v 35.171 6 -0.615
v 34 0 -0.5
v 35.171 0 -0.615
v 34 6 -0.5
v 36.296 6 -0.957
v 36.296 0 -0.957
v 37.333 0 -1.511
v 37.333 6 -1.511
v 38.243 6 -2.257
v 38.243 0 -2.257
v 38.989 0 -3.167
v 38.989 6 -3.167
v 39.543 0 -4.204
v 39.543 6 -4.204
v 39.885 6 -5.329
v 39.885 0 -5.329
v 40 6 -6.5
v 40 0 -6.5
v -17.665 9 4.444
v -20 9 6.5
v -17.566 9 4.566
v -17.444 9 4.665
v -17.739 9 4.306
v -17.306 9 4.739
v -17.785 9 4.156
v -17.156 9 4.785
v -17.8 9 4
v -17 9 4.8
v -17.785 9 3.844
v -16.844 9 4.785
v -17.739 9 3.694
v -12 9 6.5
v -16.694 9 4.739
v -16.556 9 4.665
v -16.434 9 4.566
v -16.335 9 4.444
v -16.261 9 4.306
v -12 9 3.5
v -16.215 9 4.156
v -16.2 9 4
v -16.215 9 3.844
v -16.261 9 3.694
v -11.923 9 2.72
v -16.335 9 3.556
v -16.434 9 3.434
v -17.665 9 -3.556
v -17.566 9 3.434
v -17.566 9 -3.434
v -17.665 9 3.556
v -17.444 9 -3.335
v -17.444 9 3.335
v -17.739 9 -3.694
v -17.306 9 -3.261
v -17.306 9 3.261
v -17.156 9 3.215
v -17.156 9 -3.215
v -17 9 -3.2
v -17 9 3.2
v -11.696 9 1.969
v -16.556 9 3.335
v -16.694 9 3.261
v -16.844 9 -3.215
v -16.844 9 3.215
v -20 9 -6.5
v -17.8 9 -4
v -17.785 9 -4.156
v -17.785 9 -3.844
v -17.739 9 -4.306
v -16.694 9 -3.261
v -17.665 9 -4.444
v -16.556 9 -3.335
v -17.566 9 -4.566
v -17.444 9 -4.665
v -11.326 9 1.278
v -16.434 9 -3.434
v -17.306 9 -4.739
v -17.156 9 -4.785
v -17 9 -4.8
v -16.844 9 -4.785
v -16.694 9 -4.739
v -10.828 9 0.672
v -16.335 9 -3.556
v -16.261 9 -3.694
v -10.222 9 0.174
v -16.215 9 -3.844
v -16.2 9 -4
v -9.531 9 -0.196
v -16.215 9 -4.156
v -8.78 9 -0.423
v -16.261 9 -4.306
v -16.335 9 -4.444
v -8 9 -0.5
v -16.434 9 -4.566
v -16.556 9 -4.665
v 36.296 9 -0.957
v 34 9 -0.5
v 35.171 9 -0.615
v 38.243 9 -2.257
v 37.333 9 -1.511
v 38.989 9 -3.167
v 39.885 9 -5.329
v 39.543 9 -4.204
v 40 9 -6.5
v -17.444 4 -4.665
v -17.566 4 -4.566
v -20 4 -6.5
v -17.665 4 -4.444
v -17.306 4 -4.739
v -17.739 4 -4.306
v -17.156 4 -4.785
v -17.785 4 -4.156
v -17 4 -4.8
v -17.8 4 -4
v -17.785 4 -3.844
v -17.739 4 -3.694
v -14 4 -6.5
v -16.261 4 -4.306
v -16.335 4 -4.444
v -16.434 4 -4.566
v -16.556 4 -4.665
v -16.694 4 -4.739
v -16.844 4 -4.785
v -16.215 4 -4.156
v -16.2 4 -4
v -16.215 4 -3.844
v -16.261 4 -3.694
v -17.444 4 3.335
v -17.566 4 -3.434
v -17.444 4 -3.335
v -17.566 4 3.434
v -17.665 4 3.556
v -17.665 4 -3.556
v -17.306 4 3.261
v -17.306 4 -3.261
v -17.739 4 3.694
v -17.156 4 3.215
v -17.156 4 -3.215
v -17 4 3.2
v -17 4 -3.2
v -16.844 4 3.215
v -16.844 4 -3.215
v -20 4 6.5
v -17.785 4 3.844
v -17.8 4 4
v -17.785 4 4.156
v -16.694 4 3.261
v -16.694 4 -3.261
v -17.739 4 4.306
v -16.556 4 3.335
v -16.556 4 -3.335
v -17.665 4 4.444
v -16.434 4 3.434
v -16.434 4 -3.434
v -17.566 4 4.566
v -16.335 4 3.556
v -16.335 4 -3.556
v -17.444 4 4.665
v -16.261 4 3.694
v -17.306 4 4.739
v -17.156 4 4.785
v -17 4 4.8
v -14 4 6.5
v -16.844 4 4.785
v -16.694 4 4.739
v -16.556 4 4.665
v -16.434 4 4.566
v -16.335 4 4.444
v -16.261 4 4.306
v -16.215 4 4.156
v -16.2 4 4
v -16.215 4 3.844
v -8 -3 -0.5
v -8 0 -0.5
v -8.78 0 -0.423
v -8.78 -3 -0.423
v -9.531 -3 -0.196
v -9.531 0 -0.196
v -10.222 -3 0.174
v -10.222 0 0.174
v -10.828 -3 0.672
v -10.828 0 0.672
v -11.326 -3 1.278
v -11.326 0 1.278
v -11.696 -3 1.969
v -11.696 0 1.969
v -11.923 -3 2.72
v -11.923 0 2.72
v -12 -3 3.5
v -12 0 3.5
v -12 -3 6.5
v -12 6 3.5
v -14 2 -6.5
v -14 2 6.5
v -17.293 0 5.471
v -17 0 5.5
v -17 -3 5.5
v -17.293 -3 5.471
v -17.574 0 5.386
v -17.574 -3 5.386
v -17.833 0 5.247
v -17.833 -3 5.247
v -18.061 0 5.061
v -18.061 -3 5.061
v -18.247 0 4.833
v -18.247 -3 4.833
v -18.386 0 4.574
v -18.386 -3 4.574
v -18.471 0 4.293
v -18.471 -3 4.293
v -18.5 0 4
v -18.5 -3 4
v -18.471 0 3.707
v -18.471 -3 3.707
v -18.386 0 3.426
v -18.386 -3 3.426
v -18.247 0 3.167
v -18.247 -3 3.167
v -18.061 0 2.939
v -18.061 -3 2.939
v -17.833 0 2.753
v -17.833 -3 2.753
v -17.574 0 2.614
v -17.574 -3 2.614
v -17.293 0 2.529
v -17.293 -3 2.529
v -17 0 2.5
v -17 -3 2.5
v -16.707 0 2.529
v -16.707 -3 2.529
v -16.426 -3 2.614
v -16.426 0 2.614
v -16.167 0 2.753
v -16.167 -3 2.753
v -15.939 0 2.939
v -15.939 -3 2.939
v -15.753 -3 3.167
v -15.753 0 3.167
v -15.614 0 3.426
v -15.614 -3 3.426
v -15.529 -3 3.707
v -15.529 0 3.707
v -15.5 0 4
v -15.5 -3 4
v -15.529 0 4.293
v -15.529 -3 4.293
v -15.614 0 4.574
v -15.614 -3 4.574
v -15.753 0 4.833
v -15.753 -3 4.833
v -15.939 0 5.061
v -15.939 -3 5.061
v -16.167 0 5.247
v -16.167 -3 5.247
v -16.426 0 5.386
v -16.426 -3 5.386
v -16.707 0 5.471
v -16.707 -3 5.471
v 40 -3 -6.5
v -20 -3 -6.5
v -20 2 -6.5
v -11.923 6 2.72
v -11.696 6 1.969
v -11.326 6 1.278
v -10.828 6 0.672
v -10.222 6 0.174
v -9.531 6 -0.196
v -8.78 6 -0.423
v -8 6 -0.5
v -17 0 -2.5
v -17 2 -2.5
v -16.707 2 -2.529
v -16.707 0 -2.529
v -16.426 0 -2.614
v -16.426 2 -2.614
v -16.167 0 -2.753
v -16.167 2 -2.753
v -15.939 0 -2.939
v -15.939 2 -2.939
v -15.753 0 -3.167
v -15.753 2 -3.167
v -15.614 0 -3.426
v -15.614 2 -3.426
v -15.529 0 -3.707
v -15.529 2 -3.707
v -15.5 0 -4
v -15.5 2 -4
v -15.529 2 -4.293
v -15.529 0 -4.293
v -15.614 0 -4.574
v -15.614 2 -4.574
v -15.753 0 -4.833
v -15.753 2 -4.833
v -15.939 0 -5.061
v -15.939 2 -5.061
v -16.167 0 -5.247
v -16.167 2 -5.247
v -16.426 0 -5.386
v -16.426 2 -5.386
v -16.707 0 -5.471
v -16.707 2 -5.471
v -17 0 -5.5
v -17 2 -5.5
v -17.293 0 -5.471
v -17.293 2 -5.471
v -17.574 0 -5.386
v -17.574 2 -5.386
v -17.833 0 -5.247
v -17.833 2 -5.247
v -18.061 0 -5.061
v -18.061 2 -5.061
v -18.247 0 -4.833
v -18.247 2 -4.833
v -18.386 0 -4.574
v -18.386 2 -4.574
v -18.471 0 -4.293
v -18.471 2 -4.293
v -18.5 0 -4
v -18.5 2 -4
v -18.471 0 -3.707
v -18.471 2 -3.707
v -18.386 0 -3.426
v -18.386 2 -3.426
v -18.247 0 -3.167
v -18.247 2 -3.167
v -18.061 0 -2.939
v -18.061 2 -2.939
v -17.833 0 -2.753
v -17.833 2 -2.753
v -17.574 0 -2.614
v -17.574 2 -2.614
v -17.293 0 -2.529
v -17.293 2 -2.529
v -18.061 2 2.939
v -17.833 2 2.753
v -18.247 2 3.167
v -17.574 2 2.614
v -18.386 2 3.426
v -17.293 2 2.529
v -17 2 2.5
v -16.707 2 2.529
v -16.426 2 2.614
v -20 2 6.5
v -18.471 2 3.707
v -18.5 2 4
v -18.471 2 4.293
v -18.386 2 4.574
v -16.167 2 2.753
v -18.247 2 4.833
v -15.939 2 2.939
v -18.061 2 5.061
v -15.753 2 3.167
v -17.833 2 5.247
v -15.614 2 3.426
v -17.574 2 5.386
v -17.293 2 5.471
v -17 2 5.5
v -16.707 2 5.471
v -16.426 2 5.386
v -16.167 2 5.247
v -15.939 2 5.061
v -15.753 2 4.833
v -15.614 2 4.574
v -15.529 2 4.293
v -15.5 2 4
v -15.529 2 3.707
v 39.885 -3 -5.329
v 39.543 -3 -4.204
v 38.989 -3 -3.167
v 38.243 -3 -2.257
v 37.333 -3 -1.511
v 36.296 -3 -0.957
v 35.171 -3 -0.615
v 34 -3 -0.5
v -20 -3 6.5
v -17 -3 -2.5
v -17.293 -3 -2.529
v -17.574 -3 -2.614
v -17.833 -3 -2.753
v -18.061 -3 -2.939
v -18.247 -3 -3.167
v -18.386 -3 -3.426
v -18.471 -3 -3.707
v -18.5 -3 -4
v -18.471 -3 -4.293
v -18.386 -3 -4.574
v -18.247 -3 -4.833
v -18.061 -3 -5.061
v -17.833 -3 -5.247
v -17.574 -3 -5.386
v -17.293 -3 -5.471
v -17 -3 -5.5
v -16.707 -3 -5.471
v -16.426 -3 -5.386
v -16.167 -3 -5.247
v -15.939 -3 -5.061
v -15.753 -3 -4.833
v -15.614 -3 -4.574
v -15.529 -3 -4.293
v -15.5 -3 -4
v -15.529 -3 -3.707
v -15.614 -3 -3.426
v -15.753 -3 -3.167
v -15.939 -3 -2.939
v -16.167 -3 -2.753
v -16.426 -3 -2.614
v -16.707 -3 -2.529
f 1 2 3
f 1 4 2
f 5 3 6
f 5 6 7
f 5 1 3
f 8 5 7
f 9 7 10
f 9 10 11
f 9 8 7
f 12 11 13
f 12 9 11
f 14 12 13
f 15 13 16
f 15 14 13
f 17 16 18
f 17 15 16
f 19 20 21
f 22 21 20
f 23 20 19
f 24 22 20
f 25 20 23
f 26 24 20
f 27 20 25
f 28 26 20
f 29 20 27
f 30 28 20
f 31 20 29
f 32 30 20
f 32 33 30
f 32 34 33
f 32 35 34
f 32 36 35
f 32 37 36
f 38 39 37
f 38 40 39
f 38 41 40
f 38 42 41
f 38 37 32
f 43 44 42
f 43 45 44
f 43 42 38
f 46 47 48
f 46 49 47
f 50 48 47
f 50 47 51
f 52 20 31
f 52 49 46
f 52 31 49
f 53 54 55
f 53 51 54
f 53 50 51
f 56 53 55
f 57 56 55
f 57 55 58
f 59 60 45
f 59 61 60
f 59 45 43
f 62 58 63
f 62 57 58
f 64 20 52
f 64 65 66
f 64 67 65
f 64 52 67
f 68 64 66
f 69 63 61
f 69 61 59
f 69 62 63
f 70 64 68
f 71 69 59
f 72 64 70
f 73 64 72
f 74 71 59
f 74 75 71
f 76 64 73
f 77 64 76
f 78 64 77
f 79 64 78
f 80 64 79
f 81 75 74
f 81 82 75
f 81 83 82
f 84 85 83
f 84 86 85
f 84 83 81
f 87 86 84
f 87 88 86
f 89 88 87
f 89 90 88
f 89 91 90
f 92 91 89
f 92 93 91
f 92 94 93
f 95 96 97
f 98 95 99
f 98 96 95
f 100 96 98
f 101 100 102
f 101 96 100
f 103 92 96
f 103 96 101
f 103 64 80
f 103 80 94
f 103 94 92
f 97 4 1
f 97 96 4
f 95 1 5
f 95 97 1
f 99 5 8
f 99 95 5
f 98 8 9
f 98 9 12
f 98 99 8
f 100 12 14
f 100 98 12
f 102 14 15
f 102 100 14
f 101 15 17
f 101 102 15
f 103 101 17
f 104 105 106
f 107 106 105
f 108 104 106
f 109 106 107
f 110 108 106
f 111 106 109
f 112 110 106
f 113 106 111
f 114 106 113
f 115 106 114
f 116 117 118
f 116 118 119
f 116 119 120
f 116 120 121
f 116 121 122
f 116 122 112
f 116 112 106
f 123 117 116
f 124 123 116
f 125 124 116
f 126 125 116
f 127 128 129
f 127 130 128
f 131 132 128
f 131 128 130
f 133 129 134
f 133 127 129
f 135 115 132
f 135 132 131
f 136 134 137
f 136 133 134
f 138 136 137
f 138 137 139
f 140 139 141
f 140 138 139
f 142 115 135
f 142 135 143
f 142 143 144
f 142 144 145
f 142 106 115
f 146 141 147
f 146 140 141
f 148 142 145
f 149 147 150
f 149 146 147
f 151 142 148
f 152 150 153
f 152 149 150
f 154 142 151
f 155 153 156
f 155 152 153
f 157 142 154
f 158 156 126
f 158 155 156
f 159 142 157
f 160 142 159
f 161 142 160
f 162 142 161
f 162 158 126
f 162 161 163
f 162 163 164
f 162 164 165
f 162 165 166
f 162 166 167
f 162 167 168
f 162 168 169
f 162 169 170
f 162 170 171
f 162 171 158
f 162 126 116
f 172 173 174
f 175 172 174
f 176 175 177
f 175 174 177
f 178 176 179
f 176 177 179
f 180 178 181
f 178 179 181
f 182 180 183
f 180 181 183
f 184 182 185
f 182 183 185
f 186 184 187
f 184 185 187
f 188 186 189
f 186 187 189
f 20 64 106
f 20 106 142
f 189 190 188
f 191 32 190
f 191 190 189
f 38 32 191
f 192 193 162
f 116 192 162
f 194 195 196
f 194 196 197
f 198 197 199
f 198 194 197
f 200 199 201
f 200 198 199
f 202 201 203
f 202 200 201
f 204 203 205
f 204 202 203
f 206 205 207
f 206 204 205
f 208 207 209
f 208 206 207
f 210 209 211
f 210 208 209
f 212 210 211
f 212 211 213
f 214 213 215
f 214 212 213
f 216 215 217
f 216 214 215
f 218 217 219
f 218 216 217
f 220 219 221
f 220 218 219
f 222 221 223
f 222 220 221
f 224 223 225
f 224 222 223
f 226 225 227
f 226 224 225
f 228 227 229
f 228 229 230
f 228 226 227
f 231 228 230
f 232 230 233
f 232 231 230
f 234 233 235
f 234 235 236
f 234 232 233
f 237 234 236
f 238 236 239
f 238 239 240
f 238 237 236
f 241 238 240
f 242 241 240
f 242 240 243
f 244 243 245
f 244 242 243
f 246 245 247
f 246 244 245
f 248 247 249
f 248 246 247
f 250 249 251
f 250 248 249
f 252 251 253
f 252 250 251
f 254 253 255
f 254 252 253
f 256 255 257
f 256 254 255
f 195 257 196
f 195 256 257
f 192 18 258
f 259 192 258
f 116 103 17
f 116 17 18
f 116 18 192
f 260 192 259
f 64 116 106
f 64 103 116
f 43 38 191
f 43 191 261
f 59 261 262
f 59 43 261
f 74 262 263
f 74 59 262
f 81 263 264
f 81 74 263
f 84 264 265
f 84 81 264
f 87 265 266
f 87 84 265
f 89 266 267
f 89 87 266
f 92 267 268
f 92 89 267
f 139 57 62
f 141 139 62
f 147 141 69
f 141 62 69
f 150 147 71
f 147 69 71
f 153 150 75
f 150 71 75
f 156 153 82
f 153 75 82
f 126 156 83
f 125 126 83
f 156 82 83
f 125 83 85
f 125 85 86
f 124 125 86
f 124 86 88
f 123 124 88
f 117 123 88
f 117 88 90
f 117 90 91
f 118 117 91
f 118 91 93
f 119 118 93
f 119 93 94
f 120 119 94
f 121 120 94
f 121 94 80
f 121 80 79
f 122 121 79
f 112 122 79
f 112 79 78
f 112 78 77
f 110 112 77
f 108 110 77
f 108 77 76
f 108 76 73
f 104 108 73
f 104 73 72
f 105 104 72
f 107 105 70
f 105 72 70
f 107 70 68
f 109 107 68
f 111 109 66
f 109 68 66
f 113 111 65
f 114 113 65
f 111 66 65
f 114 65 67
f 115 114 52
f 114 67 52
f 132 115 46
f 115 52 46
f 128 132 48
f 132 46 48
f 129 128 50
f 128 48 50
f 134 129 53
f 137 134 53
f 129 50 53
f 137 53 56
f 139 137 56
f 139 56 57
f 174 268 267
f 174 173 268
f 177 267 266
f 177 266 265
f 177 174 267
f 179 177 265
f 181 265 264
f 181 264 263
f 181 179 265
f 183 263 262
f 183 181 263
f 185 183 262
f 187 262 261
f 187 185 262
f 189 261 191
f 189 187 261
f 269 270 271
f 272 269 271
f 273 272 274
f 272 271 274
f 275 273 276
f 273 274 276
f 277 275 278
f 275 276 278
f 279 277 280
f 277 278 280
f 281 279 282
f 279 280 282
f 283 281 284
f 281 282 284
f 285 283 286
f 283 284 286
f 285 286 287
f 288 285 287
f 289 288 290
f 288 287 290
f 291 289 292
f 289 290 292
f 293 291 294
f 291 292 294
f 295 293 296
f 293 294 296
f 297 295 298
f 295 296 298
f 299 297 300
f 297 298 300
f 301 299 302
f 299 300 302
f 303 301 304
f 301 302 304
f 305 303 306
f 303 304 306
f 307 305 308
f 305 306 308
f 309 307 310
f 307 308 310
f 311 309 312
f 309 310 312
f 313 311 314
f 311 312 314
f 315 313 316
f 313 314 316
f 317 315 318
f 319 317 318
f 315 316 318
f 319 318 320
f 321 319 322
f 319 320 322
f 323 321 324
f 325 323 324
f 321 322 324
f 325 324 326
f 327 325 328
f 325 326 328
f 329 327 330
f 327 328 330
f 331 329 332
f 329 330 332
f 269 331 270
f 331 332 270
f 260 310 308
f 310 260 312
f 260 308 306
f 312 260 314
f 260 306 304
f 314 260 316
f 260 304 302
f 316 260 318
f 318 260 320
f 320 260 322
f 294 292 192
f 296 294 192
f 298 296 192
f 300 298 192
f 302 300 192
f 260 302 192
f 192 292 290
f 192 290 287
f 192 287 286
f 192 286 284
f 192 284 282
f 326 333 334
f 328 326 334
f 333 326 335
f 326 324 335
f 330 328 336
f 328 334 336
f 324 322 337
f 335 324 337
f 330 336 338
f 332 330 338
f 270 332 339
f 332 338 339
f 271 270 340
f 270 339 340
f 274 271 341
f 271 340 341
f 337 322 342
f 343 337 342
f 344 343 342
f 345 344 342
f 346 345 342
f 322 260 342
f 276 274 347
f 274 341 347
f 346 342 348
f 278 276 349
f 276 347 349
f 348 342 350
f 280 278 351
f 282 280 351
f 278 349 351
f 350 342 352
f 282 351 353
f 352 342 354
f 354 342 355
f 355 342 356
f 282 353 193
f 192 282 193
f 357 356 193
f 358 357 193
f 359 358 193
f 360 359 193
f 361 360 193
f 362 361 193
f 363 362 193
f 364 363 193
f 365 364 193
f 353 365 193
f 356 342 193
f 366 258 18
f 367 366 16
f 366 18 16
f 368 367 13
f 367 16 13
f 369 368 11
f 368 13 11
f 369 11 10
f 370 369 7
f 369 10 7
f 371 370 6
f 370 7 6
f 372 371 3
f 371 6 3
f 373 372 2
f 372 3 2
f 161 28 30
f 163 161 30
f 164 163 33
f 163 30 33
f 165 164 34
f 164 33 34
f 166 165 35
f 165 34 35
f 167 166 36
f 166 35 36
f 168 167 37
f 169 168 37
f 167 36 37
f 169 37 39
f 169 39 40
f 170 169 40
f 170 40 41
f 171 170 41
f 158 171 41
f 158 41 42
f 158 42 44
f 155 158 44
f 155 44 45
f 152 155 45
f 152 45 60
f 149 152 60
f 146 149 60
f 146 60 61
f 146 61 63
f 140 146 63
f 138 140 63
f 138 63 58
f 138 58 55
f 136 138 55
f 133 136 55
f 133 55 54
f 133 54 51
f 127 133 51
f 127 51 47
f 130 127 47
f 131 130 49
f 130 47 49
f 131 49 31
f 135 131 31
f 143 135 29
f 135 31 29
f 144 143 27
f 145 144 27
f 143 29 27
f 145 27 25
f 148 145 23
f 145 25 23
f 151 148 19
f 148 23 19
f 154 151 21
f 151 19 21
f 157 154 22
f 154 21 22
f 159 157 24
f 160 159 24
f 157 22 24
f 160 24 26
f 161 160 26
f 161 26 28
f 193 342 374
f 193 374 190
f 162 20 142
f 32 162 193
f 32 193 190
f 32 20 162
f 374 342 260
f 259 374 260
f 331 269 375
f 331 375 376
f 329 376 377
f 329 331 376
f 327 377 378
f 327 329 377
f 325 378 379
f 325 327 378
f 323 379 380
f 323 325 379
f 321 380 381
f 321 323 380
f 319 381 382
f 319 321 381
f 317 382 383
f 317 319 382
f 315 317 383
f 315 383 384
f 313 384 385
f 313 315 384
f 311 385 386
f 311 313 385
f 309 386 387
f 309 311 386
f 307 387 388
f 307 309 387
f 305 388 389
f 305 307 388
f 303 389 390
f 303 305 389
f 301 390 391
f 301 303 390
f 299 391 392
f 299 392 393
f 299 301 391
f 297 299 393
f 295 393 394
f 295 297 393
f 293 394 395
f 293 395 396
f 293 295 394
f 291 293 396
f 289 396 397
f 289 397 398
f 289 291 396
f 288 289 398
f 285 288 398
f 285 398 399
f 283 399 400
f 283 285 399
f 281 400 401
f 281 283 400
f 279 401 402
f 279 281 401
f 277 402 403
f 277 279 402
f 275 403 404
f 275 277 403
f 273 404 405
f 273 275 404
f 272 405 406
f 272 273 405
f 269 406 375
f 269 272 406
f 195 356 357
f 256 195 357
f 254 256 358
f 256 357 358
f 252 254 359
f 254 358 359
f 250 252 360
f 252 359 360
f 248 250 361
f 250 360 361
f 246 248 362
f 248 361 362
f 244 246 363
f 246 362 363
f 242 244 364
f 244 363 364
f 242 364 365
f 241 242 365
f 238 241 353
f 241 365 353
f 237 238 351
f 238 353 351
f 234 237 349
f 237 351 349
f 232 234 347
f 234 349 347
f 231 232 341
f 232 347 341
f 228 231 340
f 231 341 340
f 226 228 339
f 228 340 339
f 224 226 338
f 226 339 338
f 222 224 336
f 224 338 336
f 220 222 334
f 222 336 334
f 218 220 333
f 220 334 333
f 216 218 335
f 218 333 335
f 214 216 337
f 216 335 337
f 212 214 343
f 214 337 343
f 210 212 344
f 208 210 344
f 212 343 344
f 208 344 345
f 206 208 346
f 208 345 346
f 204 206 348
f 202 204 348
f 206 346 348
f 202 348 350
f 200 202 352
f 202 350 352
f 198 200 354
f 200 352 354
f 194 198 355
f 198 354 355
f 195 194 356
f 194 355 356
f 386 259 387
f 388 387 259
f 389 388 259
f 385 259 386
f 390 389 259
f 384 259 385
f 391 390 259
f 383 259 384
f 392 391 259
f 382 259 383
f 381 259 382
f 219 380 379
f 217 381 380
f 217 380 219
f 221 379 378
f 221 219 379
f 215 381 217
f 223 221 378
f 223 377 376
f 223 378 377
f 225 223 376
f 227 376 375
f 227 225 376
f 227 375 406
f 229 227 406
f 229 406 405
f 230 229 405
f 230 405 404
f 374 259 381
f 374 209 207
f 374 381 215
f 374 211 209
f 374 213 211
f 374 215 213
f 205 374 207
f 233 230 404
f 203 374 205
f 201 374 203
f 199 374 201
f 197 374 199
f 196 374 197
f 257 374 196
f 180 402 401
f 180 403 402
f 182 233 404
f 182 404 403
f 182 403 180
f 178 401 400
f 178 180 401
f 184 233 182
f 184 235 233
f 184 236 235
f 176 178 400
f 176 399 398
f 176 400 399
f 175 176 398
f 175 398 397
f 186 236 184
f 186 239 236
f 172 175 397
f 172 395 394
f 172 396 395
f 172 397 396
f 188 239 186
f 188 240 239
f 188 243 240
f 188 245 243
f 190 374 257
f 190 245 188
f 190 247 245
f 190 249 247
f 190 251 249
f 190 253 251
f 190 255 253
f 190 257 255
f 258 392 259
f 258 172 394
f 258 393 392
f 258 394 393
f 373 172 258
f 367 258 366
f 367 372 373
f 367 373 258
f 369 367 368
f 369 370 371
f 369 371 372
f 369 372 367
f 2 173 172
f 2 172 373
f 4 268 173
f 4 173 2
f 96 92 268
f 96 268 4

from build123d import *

# Parameters (mm, degrees)
SKETCH1_W           = 40
SKETCH1_H           = 13
BOSS_EXTRUDE1_DEPTH = 6
SKETCH2_W           = 6
SKETCH2_H           = 2
CUT_EXTRUDE1_DEPTH  = 25.596747752
SKETCH3_R           = 0.8
CUT_EXTRUDE2_DEPTH  = 2
SKETCH4_W           = 32
SKETCH4_H           = 7
CUT_EXTRUDE3_DEPTH  = 22.868927729
FILLET1_R           = 4
SKETCH5_R           = 1.5
CUT_EXTRUDE4_DEPTH  = 2
SKETCH6_W           = 6
SKETCH6_H           = 6
BOSS_EXTRUDE2_DEPTH = 20
FILLET3_R           = 6
SKETCH7_R           = 1.5
BOSS_EXTRUDE3_DEPTH = 3
BOSS_EXTRUDE4_START = 3
SKETCH8_R           = 0.8
BOSS_EXTRUDE4_DEPTH = 3


with BuildPart() as part:
    # Sketch1 → Boss-Extrude1 (new body)
    with BuildSketch(Plane(origin=(0, 0, 0), x_dir=(1, 0, 0), z_dir=(0, 1, 0))):
        Rectangle(SKETCH1_W, SKETCH1_H)
    extrude(amount=BOSS_EXTRUDE1_DEPTH)

    # Sketch2 → Cut-Extrude1 (cut, through all)
    with BuildSketch(Plane.XY.offset(6.5)):
        with Locations((-17, 3)):
            Rectangle(SKETCH2_W, SKETCH2_H)
    extrude(amount=-CUT_EXTRUDE1_DEPTH, mode=Mode.SUBTRACT)

    # Sketch3 → Cut-Extrude2 (cut)
    with BuildSketch(Plane(origin=(0, 6, 0), x_dir=(1, 0, 0), z_dir=(0, 1, 0))):
        with Locations(Location((-17, 4, 0), (0, 0, 270))):
            Circle(SKETCH3_R)
        with Locations(Location((-17, -4, 0), (0, 0, 270))):
            Circle(SKETCH3_R)
    extrude(amount=-CUT_EXTRUDE2_DEPTH, mode=Mode.SUBTRACT)

    # Sketch4 → Cut-Extrude3 (cut, through all)
    with BuildSketch(Plane(origin=(0, 6, 0), x_dir=(1, 0, 0), z_dir=(0, 1, 0))):
        with Locations((4, -3)):
            Rectangle(SKETCH4_W, SKETCH4_H)
    extrude(amount=-CUT_EXTRUDE3_DEPTH, mode=Mode.SUBTRACT)

    # Fillet1
    fillet1_edges = [part.edges().sort_by_distance(p)[0] for p in [
        (-12, 3, -0.5),
    ]]
    fillet(fillet1_edges, radius=FILLET1_R)

    # Sketch5 → Cut-Extrude4 (cut)
    with BuildSketch(Plane(origin=(0, 2, 0), x_dir=(1, 0, 0), z_dir=(0, 1, 0))):
        with Locations(Location((-17, 4, 0), (0, 0, 270))):
            Circle(SKETCH5_R)
        with Locations(Location((-17, -4, 0), (0, 0, 270))):
            Circle(SKETCH5_R)
    extrude(amount=-CUT_EXTRUDE4_DEPTH, mode=Mode.SUBTRACT)

    # Sketch6 → Boss-Extrude2 (add)
    with BuildSketch(Plane(origin=(20, 0, 0), x_dir=(0, 0, -1), z_dir=(1, 0, 0))):
        with Locations((3.5, 3)):
            Rectangle(SKETCH6_W, SKETCH6_H)
    extrude(amount=BOSS_EXTRUDE2_DEPTH)

    # Fillet3
    fillet3_edges = [part.edges().sort_by_distance(p)[0] for p in [
        (40, 3, -0.5),
    ]]
    fillet(fillet3_edges, radius=FILLET3_R - 0.0001)  # a hair under: the kernel refuses the full size

    # Sketch7 → Boss-Extrude3 (add)
    with BuildSketch(Plane.XZ):
        with BuildLine():
            Line((-20, -6.5), (40, -6.5))
            ThreePointArc((40, -6.5), (38.242640687, -2.257359313), (34, -0.5))
            Line((34, -0.5), (-8, -0.5))
            ThreePointArc((-8, -0.5), (-10.828427125, 0.671572875), (-12, 3.5))
            Line((-12, 3.5), (-12, 6.5))
            Line((-12, 6.5), (-20, 6.5))
            Line((-20, 6.5), (-20, -6.5))
        make_face()
        with Locations(Location((-17, 4, 0), (0, 0, 90))):
            Circle(SKETCH7_R, mode=Mode.SUBTRACT)
        with Locations(Location((-17, -4, 0), (0, 0, 90))):
            Circle(SKETCH7_R, mode=Mode.SUBTRACT)
    extrude(amount=BOSS_EXTRUDE3_DEPTH)

    # Sketch8 → Boss-Extrude4 (add)
    with BuildSketch(Plane(origin=(0, 6, 0), x_dir=(1, 0, 0), z_dir=(0, 1, 0)).offset(BOSS_EXTRUDE4_START)):
        with BuildLine():
            Line((-8, 0.5), (34, 0.5))
            ThreePointArc((34, 0.5), (38.242640687, 2.257359313), (40, 6.5))
            Line((40, 6.5), (-20, 6.5))
            Line((-20, 6.5), (-20, -6.5))
            Line((-20, -6.5), (-12, -6.5))
            Line((-12, -6.5), (-12, -3.5))
            ThreePointArc((-12, -3.5), (-10.828427125, -0.671572875), (-8, 0.5))
        make_face()
        with Locations(Location((-17, -4, 0), (0, 0, 270))):
            Circle(SKETCH8_R, mode=Mode.SUBTRACT)
        with Locations(Location((-17, 4, 0), (0, 0, 270))):
            Circle(SKETCH8_R, mode=Mode.SUBTRACT)
    extrude(amount=-BOSS_EXTRUDE4_DEPTH)


solid = part.part
